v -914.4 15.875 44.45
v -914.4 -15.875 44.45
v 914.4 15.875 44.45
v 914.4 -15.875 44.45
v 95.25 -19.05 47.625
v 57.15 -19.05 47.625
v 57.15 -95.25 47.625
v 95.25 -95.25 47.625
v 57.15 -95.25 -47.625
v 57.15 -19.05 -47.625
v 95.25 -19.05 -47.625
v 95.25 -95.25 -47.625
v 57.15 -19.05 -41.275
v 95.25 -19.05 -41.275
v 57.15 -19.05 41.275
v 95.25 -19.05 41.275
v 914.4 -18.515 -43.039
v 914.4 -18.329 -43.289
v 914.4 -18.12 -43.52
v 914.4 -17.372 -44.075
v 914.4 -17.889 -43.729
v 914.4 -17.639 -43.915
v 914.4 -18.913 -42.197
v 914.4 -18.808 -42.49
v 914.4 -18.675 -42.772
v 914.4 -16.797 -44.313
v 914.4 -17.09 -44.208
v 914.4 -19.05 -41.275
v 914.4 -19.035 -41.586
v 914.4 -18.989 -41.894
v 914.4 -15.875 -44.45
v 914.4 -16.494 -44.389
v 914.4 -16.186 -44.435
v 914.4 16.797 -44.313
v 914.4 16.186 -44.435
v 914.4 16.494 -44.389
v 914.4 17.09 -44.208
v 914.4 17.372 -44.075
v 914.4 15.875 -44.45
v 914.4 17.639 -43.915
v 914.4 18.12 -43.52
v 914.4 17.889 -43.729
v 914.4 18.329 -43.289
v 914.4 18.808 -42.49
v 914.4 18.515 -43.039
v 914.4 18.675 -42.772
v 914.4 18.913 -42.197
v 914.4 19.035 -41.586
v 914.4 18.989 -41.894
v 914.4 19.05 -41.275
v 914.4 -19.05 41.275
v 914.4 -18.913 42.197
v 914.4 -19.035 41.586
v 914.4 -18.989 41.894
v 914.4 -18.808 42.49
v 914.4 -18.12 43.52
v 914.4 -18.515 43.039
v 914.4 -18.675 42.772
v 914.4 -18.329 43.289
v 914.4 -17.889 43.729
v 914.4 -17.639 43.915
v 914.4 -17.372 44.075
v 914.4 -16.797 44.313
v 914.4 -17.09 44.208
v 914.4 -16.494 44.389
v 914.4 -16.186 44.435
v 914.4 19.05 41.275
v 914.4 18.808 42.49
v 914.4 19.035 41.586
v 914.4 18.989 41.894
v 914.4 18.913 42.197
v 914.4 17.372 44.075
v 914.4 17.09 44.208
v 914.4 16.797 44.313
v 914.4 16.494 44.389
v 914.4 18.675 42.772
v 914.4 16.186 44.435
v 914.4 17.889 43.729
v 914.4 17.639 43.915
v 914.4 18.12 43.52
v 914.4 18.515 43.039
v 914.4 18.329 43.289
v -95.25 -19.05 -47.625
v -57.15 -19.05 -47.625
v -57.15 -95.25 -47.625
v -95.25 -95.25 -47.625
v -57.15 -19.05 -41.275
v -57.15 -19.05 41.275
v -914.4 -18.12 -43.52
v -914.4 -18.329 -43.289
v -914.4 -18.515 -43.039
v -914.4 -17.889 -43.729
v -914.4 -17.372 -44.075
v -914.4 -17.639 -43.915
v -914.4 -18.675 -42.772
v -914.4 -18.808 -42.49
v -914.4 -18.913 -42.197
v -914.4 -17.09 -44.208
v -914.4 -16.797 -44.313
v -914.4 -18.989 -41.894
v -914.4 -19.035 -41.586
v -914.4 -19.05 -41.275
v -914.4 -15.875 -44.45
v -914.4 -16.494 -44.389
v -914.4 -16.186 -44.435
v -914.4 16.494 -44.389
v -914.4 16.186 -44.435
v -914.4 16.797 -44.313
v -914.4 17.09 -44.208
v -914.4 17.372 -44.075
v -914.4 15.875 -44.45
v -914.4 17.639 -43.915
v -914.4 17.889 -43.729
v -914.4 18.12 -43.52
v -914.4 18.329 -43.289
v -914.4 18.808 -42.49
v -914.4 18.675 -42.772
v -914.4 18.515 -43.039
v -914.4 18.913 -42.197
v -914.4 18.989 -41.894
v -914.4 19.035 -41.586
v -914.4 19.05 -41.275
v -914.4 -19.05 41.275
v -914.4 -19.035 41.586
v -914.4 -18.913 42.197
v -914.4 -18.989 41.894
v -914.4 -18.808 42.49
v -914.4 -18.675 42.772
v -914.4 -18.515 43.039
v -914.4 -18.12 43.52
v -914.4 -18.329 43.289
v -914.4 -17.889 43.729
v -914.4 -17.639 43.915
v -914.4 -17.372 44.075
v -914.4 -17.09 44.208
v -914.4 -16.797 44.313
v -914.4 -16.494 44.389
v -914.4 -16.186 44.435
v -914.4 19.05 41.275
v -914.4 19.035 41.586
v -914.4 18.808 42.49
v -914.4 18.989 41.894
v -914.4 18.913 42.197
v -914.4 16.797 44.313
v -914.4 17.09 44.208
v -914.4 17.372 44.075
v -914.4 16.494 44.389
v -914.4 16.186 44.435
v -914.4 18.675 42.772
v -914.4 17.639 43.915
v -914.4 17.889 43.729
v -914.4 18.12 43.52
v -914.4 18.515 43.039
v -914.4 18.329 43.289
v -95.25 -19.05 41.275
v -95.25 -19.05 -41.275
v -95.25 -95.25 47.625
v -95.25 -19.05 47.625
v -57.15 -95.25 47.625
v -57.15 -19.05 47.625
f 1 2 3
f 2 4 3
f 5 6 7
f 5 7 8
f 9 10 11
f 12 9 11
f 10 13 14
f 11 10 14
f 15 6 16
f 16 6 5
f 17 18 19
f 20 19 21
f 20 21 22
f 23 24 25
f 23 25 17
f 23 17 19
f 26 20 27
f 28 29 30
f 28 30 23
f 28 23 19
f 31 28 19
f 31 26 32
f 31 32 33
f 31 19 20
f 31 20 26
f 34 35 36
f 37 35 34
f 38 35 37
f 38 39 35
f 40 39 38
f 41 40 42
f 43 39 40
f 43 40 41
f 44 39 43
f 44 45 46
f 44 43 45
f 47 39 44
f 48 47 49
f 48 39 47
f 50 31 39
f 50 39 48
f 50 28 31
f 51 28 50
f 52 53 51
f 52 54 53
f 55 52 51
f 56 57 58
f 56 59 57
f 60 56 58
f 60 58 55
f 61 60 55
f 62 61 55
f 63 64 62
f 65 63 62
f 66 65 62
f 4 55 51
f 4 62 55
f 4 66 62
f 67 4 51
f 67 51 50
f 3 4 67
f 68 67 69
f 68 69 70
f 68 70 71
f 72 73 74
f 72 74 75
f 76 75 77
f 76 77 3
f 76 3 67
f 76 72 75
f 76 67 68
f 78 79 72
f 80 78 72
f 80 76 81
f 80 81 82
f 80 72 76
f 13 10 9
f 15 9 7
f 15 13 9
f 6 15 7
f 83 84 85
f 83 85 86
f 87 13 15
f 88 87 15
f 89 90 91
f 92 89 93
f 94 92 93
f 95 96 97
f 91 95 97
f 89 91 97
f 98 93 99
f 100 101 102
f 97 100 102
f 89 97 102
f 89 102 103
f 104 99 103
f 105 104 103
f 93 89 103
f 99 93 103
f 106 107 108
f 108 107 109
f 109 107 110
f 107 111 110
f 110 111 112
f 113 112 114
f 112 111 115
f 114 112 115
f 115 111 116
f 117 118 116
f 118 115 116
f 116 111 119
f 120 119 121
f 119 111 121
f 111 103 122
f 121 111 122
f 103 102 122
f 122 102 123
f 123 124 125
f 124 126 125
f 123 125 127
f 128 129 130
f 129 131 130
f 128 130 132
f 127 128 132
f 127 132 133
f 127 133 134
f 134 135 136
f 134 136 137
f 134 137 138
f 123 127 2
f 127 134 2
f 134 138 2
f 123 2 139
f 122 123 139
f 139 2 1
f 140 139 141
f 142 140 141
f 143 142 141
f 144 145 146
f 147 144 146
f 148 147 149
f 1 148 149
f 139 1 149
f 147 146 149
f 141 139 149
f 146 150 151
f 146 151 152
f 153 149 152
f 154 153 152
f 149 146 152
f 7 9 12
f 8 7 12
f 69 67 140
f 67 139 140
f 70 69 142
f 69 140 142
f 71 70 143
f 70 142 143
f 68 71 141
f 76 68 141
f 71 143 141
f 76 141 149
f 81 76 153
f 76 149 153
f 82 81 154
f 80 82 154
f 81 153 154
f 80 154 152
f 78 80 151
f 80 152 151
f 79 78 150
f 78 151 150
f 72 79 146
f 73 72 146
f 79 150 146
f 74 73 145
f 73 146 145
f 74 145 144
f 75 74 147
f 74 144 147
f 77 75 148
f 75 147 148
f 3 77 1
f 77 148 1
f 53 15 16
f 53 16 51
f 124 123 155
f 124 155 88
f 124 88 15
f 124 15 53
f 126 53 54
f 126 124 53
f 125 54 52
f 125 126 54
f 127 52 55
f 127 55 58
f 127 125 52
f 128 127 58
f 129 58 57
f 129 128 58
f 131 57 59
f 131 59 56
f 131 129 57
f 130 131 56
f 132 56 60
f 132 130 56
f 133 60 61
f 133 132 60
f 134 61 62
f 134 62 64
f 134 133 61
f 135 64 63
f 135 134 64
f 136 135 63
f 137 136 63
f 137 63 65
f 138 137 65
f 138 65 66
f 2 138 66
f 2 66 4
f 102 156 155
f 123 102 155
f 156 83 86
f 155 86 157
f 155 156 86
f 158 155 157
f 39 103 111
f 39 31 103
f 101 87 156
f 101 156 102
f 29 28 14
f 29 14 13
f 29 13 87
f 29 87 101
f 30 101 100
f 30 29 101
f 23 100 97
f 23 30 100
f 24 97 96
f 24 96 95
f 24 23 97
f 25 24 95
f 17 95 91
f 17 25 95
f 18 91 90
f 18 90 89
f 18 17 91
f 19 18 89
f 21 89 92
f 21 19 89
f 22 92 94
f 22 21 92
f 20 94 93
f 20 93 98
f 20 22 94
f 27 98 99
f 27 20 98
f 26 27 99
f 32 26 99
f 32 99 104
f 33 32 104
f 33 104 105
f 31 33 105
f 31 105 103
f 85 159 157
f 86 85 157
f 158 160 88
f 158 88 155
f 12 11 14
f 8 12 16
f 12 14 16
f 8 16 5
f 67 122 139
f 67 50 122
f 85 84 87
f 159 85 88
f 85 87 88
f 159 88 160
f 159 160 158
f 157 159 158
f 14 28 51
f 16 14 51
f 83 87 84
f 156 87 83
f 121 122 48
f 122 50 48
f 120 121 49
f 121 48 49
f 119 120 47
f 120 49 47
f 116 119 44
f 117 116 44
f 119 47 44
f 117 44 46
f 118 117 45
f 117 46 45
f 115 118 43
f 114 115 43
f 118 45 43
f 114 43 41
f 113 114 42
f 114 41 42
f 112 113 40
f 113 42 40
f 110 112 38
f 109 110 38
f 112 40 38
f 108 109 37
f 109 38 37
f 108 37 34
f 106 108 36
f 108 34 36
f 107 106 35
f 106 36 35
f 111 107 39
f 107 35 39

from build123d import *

# Parameters (mm, degrees)
F0_W     = 38.1
F0_H     = 88.9
F1_DEPTH = 914.4
F2_R     = 3.175
F4_W     = 38.1
F4_H     = 95.25
F5_DEPTH = 76.2


with BuildPart() as f1:
    # F0 (on Right) → F1 (new body, symmetric)
    with BuildSketch(Plane.YZ):
        Rectangle(F0_W, F0_H)
    extrude(amount=F1_DEPTH, both=True)

    # F2
    f2_edges = [f1.edges().sort_by_distance(p)[0] for p in [
        (0, -19.05, 44.45),
        (0, 19.05, 44.45),
        (0, -19.05, -44.45),
        (0, 19.05, -44.45),
    ]]
    fillet(f2_edges, radius=F2_R)

    # F4 (on face) → F5 (join)
    with BuildSketch(Plane.XZ.offset(19.05)):
        with Locations((76.2, 0)):
            Rectangle(F4_W, F4_H)
    extrude(amount=F5_DEPTH)

    # F6: F1 across plane


with BuildPart() as f1_1:
    add(f1.part)
    add(f1.part.mirror(Plane.YZ))


solid = f1_1.part
